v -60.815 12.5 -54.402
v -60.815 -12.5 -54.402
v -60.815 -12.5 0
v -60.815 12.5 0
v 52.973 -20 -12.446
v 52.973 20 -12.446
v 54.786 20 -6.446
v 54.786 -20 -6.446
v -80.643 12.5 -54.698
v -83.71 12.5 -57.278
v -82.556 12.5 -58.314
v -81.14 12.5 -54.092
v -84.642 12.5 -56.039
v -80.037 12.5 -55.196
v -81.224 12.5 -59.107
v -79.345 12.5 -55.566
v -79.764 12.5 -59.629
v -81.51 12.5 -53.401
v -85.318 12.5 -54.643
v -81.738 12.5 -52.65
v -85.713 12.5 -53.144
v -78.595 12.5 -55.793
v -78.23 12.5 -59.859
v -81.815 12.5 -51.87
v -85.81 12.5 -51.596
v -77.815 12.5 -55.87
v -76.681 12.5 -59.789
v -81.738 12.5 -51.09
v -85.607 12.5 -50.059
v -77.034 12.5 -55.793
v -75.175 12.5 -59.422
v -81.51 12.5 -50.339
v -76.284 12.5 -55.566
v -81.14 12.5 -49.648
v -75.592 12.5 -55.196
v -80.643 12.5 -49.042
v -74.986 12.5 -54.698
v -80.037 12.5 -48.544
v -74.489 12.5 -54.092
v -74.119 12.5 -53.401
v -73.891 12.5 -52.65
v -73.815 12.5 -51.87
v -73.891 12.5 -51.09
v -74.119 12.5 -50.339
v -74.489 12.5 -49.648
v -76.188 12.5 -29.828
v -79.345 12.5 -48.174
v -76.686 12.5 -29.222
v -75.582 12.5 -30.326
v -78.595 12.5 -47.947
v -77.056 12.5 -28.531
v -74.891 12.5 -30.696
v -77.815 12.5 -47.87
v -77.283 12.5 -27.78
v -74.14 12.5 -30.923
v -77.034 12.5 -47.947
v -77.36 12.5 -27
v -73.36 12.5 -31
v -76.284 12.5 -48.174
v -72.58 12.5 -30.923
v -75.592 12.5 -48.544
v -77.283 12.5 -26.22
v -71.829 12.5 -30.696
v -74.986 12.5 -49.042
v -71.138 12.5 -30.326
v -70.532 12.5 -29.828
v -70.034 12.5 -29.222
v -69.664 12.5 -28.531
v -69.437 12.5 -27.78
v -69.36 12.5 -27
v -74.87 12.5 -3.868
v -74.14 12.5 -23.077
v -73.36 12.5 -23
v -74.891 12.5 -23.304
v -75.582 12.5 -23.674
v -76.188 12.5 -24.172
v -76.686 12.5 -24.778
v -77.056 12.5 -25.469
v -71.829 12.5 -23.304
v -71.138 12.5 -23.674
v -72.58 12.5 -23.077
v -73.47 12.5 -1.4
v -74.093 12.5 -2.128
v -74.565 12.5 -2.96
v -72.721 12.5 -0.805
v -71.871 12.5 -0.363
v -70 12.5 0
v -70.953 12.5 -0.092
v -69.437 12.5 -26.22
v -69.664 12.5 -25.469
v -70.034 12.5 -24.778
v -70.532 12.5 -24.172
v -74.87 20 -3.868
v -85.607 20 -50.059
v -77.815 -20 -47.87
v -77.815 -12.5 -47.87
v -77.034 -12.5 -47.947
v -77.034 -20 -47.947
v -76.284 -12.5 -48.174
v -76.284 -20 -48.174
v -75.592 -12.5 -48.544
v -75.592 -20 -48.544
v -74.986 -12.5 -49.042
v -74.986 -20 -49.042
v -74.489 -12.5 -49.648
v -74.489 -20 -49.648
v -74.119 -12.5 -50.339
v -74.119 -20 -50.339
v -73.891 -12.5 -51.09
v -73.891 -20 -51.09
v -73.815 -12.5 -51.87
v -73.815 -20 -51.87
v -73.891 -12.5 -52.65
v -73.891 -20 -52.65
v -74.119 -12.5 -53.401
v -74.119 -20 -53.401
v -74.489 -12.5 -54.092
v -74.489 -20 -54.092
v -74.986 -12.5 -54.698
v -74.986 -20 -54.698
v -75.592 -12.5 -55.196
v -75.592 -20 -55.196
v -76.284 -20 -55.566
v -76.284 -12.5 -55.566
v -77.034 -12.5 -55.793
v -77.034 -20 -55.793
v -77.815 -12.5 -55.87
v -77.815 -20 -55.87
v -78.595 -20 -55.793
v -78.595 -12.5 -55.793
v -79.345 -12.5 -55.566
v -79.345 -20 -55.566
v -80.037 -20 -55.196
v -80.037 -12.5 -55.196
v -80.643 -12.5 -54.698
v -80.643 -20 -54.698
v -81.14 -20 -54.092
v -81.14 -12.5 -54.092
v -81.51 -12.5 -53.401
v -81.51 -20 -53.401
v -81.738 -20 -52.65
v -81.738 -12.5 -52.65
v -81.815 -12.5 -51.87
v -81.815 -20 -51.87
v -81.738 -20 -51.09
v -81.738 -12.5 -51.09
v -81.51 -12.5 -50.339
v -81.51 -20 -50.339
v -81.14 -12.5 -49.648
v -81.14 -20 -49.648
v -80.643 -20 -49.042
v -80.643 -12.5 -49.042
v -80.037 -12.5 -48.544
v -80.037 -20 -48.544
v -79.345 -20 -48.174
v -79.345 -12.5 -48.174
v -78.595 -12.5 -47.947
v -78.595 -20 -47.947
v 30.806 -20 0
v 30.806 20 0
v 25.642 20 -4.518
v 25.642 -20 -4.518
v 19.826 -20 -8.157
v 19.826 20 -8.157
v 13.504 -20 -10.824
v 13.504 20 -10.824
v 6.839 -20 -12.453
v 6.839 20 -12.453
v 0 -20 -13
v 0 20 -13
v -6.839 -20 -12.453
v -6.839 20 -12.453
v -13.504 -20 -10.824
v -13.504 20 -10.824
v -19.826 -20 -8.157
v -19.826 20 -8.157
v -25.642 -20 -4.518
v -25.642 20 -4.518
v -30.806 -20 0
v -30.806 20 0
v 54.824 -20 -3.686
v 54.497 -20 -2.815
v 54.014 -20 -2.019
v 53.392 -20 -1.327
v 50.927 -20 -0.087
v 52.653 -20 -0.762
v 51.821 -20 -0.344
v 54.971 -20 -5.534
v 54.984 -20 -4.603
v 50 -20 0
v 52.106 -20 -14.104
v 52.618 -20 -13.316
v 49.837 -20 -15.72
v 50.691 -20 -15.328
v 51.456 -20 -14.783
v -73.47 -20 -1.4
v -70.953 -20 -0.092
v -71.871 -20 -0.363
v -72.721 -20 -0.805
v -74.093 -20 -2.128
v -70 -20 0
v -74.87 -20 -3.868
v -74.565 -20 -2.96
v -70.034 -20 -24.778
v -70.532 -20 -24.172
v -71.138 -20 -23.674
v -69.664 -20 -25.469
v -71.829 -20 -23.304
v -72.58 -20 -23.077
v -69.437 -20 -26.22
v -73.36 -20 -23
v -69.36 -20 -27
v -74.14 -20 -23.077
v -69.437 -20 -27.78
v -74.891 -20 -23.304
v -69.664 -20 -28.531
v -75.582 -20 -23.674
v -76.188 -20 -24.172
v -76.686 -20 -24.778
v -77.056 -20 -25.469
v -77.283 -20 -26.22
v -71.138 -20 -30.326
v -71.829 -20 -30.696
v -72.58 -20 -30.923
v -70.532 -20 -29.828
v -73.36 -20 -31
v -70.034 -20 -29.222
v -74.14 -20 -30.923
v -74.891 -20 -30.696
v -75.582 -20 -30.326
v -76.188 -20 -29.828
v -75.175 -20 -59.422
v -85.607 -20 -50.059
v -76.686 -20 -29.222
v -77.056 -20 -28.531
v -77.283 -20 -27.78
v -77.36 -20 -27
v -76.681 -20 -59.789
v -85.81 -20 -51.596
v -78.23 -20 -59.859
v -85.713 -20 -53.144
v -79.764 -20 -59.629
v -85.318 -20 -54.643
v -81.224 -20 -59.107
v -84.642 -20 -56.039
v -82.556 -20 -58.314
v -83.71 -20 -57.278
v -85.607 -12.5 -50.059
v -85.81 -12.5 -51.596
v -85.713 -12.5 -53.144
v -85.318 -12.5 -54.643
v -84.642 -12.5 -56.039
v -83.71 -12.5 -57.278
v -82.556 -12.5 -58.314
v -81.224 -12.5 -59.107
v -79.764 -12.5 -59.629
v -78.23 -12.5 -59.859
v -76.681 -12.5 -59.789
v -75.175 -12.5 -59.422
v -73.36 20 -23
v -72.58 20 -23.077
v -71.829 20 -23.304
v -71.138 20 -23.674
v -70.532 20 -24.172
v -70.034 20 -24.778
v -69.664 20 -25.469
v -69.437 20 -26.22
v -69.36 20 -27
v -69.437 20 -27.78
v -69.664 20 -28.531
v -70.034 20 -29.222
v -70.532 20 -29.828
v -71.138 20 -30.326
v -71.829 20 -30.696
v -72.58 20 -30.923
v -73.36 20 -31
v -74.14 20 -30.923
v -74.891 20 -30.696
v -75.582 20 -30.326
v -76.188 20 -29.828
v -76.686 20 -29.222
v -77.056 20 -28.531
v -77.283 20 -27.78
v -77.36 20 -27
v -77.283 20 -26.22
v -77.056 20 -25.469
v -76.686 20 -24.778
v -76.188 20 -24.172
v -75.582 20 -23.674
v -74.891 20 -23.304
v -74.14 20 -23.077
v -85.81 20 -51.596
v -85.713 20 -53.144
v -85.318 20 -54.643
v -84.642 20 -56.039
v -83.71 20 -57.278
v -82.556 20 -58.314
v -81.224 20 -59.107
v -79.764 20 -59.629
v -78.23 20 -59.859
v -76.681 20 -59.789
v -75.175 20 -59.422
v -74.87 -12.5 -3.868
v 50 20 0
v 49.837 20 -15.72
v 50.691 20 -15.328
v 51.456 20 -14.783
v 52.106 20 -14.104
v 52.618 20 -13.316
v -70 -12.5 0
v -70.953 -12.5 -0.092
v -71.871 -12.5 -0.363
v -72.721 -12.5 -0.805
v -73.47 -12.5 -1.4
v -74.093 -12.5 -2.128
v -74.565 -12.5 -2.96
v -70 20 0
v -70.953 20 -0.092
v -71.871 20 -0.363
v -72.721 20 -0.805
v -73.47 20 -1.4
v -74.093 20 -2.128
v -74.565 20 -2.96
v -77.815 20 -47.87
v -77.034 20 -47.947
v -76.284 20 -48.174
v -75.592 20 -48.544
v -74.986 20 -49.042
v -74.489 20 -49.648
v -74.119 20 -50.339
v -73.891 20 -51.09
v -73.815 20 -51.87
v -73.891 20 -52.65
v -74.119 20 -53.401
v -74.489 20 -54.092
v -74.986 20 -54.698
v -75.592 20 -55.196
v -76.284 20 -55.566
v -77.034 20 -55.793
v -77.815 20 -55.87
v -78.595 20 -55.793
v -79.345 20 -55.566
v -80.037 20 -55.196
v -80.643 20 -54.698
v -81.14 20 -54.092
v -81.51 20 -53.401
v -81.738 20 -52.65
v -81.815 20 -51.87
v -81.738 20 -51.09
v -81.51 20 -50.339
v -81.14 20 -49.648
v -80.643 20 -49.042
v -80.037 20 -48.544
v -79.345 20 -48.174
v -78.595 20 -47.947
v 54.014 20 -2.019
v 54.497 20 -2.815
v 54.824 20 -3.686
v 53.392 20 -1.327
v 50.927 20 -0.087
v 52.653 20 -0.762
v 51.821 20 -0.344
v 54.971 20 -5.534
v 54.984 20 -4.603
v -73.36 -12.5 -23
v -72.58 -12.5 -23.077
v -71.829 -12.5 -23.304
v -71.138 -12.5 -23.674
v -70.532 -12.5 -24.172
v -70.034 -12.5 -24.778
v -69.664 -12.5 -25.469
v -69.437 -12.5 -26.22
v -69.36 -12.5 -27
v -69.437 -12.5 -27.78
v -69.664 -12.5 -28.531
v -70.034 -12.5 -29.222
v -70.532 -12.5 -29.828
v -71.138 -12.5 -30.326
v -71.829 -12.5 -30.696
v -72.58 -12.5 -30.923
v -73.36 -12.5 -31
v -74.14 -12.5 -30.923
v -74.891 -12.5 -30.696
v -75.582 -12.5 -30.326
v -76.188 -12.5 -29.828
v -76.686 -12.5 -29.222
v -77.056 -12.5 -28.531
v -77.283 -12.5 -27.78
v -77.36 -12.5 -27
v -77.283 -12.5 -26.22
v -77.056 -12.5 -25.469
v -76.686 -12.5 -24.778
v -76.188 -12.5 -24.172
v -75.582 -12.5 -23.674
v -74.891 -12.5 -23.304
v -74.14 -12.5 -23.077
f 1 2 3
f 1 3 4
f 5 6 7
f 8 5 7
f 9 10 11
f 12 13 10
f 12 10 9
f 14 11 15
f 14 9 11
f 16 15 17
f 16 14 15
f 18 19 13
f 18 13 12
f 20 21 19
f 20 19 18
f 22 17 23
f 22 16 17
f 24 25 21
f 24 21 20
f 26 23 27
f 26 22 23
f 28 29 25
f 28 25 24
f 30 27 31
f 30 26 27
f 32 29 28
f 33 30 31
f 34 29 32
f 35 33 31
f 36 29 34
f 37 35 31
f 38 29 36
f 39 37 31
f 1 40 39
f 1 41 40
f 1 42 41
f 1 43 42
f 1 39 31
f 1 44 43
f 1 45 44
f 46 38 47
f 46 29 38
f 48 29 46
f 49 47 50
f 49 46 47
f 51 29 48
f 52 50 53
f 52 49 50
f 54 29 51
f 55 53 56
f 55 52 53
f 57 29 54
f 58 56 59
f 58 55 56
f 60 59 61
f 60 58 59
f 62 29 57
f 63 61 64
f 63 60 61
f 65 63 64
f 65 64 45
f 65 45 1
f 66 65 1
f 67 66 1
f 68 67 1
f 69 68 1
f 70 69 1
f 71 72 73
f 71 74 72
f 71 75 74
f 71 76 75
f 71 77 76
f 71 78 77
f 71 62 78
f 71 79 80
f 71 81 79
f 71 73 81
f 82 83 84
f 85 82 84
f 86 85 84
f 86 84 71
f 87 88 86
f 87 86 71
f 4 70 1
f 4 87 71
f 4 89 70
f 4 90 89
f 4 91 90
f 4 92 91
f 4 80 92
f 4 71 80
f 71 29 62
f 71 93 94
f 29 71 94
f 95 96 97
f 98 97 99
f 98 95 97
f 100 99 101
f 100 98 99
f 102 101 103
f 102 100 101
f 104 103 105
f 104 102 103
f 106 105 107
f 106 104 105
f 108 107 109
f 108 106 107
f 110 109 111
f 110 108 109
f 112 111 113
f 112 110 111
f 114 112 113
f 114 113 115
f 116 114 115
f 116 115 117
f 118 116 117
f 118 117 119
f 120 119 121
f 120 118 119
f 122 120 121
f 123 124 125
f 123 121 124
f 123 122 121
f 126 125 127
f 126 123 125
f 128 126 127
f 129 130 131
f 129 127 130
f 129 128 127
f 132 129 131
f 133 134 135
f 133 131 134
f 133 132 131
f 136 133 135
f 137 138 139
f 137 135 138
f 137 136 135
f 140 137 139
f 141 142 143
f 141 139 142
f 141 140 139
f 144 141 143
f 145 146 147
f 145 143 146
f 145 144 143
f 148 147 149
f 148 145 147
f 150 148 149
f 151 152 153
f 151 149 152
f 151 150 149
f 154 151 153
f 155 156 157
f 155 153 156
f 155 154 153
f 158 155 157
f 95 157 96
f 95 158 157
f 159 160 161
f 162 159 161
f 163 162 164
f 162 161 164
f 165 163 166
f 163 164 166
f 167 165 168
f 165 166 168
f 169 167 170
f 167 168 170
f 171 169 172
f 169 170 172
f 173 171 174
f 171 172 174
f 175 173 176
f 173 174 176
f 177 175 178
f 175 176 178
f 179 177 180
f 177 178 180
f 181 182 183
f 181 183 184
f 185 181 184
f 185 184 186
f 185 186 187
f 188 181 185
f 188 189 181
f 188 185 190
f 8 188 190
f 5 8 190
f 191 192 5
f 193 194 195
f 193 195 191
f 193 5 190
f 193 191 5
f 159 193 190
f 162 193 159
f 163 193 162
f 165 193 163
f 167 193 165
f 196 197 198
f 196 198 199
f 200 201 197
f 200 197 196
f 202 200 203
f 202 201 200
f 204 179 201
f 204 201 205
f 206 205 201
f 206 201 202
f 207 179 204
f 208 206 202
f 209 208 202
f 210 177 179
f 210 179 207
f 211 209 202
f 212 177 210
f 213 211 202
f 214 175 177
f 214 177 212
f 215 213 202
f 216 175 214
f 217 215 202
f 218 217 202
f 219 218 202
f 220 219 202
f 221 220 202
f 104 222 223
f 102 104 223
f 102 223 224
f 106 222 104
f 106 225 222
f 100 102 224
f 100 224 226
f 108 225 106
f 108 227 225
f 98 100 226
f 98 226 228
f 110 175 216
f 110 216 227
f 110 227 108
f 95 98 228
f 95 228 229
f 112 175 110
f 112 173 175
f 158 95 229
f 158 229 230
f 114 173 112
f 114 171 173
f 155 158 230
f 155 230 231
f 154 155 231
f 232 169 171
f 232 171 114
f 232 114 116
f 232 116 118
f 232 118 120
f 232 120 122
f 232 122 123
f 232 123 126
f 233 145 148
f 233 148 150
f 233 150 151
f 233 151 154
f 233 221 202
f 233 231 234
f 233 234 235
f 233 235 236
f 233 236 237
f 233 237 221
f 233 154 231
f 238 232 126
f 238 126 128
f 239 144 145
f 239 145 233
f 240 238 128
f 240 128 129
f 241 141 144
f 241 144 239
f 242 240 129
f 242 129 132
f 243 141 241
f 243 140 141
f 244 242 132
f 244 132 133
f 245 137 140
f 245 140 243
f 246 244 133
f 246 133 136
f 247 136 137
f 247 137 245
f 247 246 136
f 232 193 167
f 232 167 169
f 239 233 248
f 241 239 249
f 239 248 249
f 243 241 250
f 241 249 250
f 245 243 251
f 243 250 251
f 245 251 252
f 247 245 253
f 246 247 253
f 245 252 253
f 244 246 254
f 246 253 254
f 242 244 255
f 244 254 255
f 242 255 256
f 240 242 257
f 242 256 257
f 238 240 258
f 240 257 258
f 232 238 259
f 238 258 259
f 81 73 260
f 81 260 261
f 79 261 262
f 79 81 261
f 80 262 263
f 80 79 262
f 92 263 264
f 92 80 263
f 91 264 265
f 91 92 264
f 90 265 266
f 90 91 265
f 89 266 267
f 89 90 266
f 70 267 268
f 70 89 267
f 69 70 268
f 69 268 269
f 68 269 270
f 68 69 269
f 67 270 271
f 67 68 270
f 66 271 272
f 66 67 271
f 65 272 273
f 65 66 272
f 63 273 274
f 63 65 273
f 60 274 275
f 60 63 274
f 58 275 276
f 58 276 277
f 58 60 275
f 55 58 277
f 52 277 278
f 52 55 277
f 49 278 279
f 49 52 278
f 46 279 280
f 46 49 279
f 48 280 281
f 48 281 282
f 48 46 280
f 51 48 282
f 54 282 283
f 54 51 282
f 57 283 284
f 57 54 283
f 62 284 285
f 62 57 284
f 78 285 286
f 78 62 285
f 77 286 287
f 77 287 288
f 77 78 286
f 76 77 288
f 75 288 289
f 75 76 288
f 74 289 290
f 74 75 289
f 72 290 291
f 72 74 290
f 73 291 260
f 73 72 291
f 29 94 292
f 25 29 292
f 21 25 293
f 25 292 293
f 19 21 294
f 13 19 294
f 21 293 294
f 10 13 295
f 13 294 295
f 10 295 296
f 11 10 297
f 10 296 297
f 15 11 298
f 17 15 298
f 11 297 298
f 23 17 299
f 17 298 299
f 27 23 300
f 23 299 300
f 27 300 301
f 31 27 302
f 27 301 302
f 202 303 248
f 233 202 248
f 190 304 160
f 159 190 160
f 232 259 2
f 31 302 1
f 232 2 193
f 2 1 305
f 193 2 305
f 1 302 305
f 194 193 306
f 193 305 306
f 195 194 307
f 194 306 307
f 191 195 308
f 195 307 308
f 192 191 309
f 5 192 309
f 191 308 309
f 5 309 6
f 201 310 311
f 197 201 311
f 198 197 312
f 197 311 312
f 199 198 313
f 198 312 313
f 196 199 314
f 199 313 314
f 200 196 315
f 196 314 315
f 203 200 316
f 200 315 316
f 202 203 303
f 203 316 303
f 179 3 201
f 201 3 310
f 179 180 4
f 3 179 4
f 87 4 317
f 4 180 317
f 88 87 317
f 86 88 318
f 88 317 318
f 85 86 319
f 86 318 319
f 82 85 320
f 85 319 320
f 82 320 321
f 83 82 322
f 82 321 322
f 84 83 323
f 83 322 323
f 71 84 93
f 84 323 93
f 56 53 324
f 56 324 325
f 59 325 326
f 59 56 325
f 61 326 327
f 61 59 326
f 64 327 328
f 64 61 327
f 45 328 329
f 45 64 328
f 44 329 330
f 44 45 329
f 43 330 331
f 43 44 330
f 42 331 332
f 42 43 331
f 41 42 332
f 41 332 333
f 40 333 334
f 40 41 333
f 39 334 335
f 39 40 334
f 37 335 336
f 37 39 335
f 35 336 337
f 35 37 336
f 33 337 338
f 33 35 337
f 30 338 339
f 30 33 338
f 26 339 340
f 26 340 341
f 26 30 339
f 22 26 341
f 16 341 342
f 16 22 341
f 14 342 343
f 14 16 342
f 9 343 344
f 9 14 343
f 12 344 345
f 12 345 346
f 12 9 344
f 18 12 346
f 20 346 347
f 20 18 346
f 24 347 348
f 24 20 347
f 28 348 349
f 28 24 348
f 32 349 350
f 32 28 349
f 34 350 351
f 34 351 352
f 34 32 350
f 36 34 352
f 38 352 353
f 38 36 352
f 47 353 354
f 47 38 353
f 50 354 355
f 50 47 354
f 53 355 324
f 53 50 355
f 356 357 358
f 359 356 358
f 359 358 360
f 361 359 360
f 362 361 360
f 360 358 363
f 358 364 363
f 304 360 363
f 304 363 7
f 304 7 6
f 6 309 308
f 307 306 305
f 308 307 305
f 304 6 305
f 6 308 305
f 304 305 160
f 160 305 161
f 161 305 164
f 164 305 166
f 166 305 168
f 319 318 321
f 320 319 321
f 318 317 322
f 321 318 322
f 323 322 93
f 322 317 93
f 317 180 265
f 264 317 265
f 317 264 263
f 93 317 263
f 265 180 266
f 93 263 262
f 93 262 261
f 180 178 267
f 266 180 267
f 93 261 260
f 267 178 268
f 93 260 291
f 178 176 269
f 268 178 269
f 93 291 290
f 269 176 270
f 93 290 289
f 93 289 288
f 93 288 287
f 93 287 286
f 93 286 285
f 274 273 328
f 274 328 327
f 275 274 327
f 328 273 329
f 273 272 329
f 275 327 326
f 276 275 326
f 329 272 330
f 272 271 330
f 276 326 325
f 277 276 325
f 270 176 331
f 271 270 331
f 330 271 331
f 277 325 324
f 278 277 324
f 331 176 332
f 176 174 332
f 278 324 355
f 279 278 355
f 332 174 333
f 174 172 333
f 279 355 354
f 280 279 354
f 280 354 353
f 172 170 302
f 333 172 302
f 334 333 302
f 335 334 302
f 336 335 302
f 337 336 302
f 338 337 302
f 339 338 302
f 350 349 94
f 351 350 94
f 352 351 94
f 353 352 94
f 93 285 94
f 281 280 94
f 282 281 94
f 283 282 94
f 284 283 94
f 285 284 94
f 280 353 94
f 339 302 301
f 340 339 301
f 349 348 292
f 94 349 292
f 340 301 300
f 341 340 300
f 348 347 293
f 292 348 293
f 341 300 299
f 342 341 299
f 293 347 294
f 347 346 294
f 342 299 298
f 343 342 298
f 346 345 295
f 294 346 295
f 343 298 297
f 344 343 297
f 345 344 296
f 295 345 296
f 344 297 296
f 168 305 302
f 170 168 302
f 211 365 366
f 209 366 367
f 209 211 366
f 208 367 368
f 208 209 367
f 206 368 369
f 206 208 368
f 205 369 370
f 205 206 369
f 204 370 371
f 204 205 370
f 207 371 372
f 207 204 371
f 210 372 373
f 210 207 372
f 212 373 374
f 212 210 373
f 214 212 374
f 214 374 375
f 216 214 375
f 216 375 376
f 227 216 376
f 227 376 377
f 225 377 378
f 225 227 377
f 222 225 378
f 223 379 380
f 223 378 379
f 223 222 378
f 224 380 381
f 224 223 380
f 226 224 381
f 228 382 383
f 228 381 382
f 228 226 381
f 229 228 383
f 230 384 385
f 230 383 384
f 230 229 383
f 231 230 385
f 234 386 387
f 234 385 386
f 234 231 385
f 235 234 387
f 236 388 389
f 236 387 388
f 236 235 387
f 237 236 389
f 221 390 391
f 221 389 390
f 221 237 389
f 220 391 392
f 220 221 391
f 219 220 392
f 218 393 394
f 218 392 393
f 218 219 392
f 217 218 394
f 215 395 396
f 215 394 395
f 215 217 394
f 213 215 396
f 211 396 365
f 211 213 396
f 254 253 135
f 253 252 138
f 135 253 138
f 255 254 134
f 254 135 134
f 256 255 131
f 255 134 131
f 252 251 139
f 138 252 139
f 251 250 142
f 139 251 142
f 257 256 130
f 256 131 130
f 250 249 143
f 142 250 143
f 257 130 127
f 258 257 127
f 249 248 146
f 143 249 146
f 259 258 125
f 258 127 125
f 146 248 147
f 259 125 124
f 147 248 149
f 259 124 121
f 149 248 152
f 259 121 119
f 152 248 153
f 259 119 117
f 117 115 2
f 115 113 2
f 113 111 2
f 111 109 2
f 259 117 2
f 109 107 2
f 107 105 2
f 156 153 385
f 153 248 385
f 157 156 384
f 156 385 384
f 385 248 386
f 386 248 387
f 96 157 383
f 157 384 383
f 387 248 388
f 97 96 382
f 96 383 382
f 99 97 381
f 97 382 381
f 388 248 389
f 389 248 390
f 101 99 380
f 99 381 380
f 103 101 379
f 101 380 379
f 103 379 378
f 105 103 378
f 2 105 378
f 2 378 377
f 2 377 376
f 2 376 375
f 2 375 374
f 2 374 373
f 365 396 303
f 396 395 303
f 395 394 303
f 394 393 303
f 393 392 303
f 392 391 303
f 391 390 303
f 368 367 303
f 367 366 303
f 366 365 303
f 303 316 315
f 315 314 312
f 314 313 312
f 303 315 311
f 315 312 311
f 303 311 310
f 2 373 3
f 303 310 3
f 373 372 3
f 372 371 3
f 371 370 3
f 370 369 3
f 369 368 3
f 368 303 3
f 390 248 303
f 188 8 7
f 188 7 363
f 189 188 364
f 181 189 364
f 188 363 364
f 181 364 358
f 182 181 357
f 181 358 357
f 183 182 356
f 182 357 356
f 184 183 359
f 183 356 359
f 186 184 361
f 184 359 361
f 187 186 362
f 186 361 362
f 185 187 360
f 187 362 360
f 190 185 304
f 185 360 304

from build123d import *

# Parameters (mm, degrees)
SKETCH2_R           = 4
BOSS_EXTRUDE1_DEPTH = 20
SKETCH3_W           = 25
SKETCH3_H           = 25
CUT_EXTRUDE1_DEPTH  = 107.529597523


with BuildPart() as part:
    # Sketch2 → Boss-Extrude1 (new, symmetric)
    with BuildSketch(Plane(origin=(0, 0, 0), x_dir=(1, 0, 0), z_dir=(0, 1, 0))):
        with BuildLine():
            Line((-30.805843601, 0), (-70, 0))
            ThreePointArc((-70, 0), (-73.109650812, 1.084636437), (-74.870165393, 3.867971269))
            Line((-74.870165393, 3.867971269), (-85.606821951, 50.05875403))
            ThreePointArc((-85.606821951, 50.05875403), (-83.158089611, 57.823709992), (-75.174557322, 59.421847456))
            Line((-75.174557322, 59.421847456), (49.836959924, 15.71990466))
            ThreePointArc((49.836959924, 15.71990466), (51.797432477, 14.458972094), (52.973218852, 12.446279875))
            Line((52.973218852, 12.446279875), (54.786258928, 6.446279875))
            ThreePointArc((54.786258928, 6.446279875), (54.01443641, 2.019345657), (50, 0))
            Line((50, 0), (30.805843601, 0))
            ThreePointArc((30.805843601, 0), (0, 13), (-30.805843601, 0))
        make_face()
        with Locations(Location((-77.814557322, 51.87, 0), (0, 0, 270))):
            Circle(SKETCH2_R, mode=Mode.SUBTRACT)
        with Locations(Location((-73.36, 27, 0), (0, 0, 270))):
            Circle(SKETCH2_R, mode=Mode.SUBTRACT)
    extrude(amount=BOSS_EXTRUDE1_DEPTH, both=True)

    # Sketch3 → Cut-Extrude1 (cut, through all)
    with BuildSketch(Plane.XY):
        with Locations((-73.314557322, 0)):
            Rectangle(SKETCH3_W, SKETCH3_H)
    extrude(amount=-CUT_EXTRUDE1_DEPTH, mode=Mode.SUBTRACT)


solid = part.part
